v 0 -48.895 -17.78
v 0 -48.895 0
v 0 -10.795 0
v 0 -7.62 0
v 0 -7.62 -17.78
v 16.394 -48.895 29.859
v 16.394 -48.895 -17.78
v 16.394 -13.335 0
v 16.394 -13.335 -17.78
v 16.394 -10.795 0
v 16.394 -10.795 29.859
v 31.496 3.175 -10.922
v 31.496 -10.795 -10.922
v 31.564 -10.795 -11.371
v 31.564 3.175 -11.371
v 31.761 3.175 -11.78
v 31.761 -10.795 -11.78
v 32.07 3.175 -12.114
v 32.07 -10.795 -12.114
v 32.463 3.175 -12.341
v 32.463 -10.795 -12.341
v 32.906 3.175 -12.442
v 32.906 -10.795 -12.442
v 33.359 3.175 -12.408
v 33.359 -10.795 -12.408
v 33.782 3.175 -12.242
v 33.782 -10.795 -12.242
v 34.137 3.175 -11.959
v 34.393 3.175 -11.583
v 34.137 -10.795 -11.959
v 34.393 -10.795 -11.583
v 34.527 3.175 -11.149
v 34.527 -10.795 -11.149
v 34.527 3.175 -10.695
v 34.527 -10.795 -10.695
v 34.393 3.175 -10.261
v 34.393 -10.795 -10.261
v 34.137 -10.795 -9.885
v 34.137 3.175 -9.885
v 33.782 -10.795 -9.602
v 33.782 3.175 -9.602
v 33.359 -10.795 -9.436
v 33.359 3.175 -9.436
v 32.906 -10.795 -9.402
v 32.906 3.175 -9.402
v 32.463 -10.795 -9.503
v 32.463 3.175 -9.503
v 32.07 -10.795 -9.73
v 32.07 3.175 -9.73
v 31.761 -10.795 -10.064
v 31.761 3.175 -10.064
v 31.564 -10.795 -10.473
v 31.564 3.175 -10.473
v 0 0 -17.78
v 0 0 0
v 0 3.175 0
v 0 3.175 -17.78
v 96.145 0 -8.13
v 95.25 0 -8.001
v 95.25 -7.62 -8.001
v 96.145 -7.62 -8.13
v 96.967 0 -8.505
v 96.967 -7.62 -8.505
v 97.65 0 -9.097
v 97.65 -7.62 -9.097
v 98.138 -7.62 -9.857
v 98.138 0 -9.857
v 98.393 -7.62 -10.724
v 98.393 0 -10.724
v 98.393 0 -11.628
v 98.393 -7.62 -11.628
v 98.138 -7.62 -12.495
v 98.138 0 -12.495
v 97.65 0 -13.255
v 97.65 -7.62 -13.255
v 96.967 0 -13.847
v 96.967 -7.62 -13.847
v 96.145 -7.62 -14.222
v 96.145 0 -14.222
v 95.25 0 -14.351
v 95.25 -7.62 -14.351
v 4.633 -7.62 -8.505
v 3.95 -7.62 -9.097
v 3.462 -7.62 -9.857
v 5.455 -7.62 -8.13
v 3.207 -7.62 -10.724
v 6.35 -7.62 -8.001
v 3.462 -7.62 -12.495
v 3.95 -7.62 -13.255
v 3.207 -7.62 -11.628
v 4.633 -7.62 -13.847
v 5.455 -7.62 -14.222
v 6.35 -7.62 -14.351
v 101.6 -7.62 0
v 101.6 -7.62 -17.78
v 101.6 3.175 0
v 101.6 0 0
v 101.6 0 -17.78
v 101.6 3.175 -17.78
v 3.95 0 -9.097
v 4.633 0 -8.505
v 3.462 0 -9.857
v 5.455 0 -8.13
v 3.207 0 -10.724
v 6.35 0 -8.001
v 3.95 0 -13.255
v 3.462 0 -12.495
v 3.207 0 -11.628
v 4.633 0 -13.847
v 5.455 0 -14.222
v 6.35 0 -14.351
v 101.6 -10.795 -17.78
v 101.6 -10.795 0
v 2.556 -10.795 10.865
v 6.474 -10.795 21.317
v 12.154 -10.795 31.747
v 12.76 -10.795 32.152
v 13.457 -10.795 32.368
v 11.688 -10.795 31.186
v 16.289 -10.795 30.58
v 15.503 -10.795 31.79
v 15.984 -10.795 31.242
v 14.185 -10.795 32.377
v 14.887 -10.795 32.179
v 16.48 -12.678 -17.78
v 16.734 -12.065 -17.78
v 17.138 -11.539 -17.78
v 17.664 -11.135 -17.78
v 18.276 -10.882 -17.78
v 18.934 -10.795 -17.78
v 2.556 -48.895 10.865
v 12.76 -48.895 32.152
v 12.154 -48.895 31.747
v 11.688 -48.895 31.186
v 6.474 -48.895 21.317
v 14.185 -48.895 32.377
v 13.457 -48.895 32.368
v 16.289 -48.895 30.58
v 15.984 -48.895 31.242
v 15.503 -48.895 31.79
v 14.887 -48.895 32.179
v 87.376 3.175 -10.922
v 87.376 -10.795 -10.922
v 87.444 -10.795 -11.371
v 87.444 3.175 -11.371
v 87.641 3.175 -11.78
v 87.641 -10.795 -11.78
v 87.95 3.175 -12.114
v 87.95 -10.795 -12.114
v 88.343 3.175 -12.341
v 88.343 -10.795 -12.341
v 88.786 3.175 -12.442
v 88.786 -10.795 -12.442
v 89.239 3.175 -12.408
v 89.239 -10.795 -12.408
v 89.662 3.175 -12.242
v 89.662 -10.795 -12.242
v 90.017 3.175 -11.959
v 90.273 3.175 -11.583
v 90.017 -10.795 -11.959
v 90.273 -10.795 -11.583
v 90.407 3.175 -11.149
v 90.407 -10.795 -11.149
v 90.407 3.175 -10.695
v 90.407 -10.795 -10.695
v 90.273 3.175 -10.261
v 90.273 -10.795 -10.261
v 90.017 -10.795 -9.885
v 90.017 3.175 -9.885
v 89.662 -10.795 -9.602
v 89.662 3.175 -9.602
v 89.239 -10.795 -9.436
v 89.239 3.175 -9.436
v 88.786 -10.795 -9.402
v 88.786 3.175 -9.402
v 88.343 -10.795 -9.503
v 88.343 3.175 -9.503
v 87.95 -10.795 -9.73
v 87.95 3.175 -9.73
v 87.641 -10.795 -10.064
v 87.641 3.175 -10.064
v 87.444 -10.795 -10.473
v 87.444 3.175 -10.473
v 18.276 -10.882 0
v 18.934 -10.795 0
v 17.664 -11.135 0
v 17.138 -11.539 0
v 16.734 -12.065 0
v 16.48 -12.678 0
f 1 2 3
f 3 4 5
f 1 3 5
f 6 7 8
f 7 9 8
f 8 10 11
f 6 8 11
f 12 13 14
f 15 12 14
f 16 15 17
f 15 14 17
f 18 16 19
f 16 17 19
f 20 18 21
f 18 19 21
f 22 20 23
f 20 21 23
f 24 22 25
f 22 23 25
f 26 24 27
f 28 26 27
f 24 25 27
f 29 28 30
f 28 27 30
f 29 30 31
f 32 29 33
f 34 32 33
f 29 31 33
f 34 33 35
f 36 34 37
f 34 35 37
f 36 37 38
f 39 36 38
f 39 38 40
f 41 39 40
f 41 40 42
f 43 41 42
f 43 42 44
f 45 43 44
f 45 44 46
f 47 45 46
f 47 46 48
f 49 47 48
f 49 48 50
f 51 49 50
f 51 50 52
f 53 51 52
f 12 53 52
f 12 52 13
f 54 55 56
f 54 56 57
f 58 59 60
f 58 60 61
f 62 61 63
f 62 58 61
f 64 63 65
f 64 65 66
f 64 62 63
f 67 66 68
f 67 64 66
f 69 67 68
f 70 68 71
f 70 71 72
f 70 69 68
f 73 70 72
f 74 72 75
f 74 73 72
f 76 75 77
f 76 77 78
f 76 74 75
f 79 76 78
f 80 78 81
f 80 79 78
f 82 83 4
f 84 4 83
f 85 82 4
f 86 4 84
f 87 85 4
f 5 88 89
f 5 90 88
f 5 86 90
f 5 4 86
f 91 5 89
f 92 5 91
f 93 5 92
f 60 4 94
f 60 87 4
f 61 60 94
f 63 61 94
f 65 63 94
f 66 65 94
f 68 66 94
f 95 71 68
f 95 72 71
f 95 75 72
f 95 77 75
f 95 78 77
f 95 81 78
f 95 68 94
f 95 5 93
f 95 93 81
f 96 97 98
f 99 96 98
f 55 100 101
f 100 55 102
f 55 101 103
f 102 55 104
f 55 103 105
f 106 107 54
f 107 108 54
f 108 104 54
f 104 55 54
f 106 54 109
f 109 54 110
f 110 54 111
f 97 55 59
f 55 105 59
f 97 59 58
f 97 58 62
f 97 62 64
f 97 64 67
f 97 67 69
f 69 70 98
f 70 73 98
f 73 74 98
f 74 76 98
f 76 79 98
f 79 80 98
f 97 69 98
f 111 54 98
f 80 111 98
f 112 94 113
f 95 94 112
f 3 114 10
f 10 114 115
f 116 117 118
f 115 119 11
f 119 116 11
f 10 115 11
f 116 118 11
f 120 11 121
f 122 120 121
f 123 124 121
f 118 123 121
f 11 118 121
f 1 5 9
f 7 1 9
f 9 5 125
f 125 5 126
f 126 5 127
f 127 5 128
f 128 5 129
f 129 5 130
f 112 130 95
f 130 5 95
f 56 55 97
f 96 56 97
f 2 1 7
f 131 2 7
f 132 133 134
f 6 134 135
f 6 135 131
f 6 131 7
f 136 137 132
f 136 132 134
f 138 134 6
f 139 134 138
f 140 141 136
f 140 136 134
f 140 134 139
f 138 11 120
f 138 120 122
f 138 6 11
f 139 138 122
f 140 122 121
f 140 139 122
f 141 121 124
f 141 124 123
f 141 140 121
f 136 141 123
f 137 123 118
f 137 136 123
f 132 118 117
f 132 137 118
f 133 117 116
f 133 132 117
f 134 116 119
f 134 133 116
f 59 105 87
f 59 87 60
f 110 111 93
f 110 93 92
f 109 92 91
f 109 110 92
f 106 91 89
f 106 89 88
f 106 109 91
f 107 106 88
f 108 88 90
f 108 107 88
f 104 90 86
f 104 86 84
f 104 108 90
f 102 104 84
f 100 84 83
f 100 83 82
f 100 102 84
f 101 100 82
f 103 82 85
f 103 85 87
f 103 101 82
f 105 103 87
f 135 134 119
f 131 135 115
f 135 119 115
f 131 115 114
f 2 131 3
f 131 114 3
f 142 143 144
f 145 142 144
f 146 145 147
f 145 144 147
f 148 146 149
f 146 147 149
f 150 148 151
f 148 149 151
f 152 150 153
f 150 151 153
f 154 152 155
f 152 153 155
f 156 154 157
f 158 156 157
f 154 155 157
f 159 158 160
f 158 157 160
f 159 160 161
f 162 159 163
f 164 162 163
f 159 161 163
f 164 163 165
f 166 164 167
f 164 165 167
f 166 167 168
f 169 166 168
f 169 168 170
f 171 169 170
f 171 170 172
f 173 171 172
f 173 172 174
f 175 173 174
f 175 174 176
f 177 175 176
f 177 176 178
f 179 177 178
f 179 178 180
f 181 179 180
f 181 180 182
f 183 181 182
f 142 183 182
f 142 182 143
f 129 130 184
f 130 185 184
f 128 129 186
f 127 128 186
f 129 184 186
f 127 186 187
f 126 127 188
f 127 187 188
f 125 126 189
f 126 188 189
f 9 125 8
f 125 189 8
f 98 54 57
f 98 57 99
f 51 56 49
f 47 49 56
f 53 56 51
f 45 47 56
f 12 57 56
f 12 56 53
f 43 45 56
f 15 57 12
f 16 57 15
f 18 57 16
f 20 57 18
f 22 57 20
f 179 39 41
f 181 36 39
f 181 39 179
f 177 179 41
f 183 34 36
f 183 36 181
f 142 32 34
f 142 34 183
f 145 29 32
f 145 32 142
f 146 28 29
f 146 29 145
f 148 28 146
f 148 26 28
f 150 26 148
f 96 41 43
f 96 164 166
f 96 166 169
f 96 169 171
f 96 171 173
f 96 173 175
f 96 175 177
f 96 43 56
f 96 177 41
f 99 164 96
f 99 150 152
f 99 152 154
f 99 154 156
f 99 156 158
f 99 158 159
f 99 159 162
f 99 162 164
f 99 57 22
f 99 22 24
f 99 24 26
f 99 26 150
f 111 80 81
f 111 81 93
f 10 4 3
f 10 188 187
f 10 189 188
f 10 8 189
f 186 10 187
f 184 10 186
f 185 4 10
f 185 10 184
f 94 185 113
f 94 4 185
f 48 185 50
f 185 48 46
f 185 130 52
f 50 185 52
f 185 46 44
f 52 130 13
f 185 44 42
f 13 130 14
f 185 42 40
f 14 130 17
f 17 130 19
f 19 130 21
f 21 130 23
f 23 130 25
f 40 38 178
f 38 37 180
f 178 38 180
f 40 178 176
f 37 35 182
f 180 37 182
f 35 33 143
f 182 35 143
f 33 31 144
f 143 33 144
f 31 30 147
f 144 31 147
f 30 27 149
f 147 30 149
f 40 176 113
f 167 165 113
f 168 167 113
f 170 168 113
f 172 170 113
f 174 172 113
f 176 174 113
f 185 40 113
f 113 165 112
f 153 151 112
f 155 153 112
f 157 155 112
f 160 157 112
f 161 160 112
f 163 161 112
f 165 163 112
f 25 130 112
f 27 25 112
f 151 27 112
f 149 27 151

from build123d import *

# Parameters (mm, degrees)
SKETCH2_W           = 101.6
SKETCH2_H           = 17.78
BOSS_EXTRUDE1_DEPTH = 3.175
BOSS_EXTRUDE2_DEPTH = 7.62
BOSS_EXTRUDE3_DEPTH = 38.1
FILLET1_R           = 2.54
FILLET2_R           = 2.54
SKETCH5_R           = 1.524
CUT_EXTRUDE1_DEPTH  = 14.97


with BuildPart() as part:
    # Sketch2 → Boss-Extrude1 (new body)
    with BuildSketch(Plane(origin=(0, 0, 0), x_dir=(1, 0, 0), z_dir=(0, 1, 0))):
        with Locations((50.8, 8.89)):
            Rectangle(SKETCH2_W, SKETCH2_H)
    boss_extrude1 = extrude(amount=BOSS_EXTRUDE1_DEPTH)

    # Sketch3 → Boss-Extrude2 (add)
    with BuildSketch(Plane.XZ):
        with BuildLine():
            Line((95.25, -14.351), (6.35, -14.351))
            ThreePointArc((6.35, -14.351), (3.175, -11.176), (6.35, -8.001))
            Line((6.35, -8.001), (95.25, -8.001))
            ThreePointArc((95.25, -8.001), (98.425, -11.176), (95.25, -14.351))
        make_face()
    extrude(amount=BOSS_EXTRUDE2_DEPTH)

    # Mirror1: Boss-Extrude1 across plane
    add(boss_extrude1.mirror(Plane(origin=(0, -3.81, 0), x_dir=(0, 0, 1), z_dir=(0, -1, 0))))

    # Sketch4 → Boss-Extrude3 (add)
    with BuildSketch(Plane.XZ.offset(10.795)):
        with BuildLine():
            Line((0, -17.78), (16.393849753, -17.78))
            Line((16.393849753, -17.78), (16.393849753, 0))
            Line((16.393849753, 0), (16.393849753, 38.1))
            ThreePointArc((16.393849753, 38.1), (5.909394782, 20.034289362), (0, 0))
            Line((0, 0), (0, -17.78))
        make_face()
    extrude(amount=BOSS_EXTRUDE3_DEPTH)

    # Fillet1
    fillet1_edges = [part.edges().sort_by_distance(p)[0] for p in [
        (16.393849753, -10.795, -8.89),
    ]]
    fillet(fillet1_edges, radius=FILLET1_R)

    # Fillet2
    fillet2_edges = [part.edges().sort_by_distance(p)[0] for p in [
        (16.393849753, -29.845, 38.1),
    ]]
    fillet(fillet2_edges, radius=FILLET2_R)

    # Sketch5 → Cut-Extrude1 (cut, through all)
    with BuildSketch(Plane(origin=(0, -10.795, 0), x_dir=(-1, 0, 0), z_dir=(0, -1, 0))):
        with Locations((-88.9, 10.922)):
            Circle(SKETCH5_R)
        with Locations((-33.02, 10.922)):
            Circle(SKETCH5_R)
    extrude(amount=-CUT_EXTRUDE1_DEPTH, mode=Mode.SUBTRACT)


solid = part.part
